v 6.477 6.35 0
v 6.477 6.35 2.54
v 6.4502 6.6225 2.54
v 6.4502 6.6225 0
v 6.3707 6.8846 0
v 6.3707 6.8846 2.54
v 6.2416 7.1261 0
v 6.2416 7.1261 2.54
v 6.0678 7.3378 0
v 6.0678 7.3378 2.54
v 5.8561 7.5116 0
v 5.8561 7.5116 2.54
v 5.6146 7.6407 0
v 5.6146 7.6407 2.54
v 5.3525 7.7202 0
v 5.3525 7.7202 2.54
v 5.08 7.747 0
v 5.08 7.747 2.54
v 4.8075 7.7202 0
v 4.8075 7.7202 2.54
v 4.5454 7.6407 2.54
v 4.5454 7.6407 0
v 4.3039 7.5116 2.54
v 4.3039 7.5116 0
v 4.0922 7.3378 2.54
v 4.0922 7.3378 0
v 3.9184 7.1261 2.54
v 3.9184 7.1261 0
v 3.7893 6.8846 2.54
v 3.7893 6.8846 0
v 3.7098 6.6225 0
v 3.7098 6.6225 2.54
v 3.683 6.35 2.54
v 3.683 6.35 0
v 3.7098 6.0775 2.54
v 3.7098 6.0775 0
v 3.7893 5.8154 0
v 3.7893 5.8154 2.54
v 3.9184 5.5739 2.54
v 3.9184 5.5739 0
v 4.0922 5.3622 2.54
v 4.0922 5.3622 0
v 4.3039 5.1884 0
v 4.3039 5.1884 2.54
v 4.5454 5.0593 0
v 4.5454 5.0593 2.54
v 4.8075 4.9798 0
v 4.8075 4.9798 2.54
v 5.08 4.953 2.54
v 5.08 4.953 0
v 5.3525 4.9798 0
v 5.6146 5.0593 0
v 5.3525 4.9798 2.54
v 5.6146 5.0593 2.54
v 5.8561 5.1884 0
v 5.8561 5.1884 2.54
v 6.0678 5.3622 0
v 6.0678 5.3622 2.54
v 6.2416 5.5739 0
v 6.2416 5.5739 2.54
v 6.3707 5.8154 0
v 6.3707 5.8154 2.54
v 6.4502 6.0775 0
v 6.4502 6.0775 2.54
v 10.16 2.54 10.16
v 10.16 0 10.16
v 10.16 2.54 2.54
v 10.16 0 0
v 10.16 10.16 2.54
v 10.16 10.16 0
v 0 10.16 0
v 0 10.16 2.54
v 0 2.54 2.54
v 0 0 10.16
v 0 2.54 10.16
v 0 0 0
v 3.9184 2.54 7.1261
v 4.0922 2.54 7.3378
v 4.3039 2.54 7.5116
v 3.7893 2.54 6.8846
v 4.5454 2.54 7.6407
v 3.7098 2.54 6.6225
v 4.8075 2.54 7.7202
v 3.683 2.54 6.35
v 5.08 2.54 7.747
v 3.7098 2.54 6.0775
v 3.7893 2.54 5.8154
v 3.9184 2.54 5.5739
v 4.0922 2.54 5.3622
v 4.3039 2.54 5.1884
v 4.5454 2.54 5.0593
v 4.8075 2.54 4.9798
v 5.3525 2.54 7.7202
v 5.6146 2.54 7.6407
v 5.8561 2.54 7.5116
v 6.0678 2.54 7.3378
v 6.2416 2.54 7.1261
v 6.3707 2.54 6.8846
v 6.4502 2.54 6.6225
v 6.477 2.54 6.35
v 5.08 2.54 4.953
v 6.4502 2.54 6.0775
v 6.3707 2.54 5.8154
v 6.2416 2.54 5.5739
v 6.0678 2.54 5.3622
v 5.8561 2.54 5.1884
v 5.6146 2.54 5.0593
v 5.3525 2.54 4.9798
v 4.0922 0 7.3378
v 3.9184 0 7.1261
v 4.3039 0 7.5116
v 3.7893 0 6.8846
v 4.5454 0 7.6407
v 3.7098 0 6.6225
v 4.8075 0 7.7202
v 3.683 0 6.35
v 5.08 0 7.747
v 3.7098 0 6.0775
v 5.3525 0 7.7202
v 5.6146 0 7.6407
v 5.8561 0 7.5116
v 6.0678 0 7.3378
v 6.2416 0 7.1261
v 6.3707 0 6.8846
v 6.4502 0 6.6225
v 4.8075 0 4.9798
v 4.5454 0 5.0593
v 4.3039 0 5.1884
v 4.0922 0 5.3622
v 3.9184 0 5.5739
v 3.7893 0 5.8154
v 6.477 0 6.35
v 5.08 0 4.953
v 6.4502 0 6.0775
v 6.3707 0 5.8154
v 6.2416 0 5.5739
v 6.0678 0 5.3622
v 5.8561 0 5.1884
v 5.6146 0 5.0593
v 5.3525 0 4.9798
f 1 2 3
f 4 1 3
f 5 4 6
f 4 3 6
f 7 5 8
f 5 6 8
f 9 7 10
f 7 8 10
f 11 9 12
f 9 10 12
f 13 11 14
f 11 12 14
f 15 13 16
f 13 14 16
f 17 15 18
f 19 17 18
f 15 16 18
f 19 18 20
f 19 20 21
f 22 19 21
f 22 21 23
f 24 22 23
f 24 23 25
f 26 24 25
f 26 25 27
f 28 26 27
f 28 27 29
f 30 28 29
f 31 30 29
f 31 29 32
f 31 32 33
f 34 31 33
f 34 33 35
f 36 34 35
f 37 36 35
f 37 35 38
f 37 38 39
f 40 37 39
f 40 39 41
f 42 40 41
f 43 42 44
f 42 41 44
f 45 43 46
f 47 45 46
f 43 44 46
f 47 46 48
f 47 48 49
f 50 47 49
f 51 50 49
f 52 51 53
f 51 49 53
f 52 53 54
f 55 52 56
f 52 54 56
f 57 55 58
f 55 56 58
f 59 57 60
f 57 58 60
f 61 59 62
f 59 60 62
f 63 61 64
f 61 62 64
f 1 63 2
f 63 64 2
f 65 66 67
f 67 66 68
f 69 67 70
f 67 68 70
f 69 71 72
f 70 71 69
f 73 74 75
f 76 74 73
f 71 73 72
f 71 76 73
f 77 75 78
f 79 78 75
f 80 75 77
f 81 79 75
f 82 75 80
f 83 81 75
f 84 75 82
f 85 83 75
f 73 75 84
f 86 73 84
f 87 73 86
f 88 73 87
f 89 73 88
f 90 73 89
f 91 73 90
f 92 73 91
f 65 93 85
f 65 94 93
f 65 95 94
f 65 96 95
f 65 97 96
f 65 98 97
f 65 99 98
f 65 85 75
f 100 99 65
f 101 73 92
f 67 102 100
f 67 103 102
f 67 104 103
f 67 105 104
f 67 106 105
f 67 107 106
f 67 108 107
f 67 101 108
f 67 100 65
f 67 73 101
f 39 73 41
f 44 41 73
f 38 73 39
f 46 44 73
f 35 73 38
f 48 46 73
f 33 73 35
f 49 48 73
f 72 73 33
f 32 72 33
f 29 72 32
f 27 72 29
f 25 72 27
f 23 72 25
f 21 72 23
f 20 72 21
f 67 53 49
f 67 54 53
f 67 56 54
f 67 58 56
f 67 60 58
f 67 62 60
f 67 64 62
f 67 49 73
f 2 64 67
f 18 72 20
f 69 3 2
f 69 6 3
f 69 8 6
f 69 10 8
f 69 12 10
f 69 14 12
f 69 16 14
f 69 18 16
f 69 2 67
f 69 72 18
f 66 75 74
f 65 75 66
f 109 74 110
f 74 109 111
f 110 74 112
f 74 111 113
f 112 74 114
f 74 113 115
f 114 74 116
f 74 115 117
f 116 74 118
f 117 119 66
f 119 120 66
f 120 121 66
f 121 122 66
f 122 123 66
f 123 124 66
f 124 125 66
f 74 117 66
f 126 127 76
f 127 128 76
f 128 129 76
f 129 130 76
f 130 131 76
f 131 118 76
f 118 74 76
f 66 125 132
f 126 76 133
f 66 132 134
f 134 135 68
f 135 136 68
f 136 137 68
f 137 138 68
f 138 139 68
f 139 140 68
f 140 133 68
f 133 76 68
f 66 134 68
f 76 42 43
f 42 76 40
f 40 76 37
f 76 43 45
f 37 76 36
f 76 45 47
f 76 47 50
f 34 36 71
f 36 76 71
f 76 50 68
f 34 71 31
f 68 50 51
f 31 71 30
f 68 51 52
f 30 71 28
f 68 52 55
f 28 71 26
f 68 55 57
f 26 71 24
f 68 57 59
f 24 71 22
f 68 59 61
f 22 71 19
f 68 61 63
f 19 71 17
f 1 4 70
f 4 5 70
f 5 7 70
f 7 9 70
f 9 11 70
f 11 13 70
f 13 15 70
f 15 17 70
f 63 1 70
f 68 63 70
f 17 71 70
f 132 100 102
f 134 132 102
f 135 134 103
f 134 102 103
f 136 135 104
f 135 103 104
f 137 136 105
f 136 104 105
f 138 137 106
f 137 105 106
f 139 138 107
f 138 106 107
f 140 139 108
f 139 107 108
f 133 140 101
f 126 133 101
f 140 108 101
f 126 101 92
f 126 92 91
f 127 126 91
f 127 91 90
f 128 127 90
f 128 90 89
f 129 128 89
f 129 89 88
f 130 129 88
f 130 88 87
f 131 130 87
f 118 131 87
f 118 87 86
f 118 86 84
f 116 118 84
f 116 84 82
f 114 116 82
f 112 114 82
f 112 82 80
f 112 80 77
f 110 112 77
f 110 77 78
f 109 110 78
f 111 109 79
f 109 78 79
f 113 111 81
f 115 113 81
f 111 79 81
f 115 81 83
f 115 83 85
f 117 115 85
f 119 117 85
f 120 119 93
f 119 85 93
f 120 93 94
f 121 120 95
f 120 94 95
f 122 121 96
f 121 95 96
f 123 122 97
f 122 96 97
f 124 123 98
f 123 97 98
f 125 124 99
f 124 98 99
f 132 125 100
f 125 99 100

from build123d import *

# Parameters (mm, degrees)
SKETCH1_W           = 10.16
SKETCH1_H           = 10.16
BOSS_EXTRUDE1_DEPTH = 2.54
SKETCH2_W           = 10.16
SKETCH2_H           = 2.54
BOSS_EXTRUDE2_DEPTH = 7.62
SKETCH3_R           = 1.397
CUT_EXTRUDE1_DEPTH  = 10.16
SKETCH4_R           = 1.397
CUT_EXTRUDE2_DEPTH  = 10.16


with BuildPart() as part:
    # Sketch1 → Boss-Extrude1 (new body)
    with BuildSketch(Plane.XY):
        with Locations((5.08, 5.08)):
            Rectangle(SKETCH1_W, SKETCH1_H)
    extrude(amount=BOSS_EXTRUDE1_DEPTH)

    # Sketch2 → Boss-Extrude2 (add)
    with BuildSketch(Plane.XY.offset(2.54)):
        with Locations((5.08, 1.27)):
            Rectangle(SKETCH2_W, SKETCH2_H)
    extrude(amount=BOSS_EXTRUDE2_DEPTH)

    # Sketch3 → Cut-Extrude1 (cut)
    with BuildSketch(Plane.XY.offset(2.54)):
        with Locations((5.08, 6.35)):
            Circle(SKETCH3_R)
    extrude(amount=-CUT_EXTRUDE1_DEPTH, mode=Mode.SUBTRACT)

    # Sketch4 → Cut-Extrude2 (cut)
    with BuildSketch(Plane(origin=(0, 2.54, 0), x_dir=(1, 0, 0), z_dir=(0, 1, 0))):
        with Locations((5.08, -6.35)):
            Circle(SKETCH4_R)
    extrude(amount=-CUT_EXTRUDE2_DEPTH, mode=Mode.SUBTRACT)


solid = part.part
